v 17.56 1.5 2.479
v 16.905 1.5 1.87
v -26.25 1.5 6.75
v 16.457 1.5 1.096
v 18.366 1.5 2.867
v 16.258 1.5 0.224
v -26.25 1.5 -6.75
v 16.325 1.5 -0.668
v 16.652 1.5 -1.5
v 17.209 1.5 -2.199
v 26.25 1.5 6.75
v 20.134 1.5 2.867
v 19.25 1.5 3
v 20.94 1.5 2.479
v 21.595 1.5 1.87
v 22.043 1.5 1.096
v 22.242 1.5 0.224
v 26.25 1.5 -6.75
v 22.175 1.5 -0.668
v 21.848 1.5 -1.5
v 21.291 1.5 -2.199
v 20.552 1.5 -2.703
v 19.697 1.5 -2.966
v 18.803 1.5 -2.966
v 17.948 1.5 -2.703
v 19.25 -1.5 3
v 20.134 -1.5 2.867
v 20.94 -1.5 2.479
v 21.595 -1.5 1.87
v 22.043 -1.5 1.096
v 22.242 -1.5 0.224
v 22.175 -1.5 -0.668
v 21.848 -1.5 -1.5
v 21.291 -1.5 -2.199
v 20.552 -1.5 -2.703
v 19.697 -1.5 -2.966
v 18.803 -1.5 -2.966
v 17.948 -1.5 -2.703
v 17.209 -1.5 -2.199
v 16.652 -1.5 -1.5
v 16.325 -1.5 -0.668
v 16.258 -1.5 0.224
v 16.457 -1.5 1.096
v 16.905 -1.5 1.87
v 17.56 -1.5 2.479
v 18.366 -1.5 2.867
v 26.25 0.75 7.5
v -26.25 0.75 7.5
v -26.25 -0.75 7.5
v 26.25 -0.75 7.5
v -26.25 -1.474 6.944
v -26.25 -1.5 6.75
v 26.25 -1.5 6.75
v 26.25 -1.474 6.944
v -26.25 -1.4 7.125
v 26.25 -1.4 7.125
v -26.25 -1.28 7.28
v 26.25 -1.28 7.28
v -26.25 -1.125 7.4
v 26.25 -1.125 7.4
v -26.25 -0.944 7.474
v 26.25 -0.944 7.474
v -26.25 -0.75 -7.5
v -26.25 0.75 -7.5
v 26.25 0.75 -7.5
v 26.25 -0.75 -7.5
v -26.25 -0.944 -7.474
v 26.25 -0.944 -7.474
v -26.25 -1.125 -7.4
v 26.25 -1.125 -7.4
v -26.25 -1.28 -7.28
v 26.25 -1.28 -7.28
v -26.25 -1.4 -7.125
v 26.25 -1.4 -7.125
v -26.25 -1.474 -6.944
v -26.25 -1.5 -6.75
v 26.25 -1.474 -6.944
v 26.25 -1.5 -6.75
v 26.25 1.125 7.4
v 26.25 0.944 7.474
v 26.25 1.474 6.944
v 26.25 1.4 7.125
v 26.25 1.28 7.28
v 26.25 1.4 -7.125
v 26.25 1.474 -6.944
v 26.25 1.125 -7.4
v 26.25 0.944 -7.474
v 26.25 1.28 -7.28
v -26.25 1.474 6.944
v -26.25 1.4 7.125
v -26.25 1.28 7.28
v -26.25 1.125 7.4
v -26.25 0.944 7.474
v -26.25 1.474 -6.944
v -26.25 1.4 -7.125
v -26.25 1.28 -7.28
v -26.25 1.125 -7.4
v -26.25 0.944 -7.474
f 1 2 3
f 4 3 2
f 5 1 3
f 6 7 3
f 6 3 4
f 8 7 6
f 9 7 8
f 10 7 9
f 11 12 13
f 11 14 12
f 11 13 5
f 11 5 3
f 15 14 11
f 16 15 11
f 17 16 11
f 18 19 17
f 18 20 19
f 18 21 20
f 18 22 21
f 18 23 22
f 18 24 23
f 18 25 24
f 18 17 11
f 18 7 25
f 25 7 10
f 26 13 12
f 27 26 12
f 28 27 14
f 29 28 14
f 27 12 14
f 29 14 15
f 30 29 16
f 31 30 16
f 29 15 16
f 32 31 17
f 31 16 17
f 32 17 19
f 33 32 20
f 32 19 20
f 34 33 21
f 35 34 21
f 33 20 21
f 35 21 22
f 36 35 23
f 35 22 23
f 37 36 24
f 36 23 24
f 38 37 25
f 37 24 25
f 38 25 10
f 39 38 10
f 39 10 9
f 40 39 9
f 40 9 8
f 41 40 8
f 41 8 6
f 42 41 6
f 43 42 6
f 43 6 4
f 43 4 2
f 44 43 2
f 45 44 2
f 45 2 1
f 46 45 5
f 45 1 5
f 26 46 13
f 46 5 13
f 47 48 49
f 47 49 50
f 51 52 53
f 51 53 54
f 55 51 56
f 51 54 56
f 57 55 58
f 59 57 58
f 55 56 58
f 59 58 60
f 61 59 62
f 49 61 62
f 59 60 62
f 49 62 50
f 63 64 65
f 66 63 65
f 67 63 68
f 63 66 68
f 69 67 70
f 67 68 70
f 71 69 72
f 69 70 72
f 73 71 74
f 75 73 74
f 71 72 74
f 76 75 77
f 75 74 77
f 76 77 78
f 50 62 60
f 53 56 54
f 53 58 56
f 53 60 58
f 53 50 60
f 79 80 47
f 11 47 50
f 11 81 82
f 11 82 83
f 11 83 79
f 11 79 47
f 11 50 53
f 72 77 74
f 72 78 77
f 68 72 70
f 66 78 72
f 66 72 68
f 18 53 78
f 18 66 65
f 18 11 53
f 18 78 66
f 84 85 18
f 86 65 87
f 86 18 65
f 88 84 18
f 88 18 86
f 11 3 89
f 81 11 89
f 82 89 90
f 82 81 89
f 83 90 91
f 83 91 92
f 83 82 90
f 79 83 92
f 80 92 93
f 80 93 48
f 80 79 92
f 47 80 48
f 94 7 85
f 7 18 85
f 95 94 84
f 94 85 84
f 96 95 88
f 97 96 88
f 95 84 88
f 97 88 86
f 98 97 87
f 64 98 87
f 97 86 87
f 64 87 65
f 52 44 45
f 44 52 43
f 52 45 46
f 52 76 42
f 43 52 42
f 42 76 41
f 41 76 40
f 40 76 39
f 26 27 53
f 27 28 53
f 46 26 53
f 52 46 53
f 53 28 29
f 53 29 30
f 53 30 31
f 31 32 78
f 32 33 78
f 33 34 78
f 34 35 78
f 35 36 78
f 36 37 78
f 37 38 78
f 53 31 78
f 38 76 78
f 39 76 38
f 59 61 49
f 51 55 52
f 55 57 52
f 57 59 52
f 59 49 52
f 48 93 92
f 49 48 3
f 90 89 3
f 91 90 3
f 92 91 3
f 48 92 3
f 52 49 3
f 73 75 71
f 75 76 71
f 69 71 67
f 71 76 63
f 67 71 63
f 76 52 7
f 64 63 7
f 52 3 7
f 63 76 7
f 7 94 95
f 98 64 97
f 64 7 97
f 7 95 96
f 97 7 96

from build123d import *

# Parameters (mm, degrees)
SKETCH_1_W          = 52.5
SKETCH_1_H          = 15
EXTRUDE_1_DEPTH     = 1.5
FILLET_1_R          = 0.75
SKETCH_2_R          = 3
CUT_EXTRUDE_1_DEPTH = 3


with BuildPart() as part:
    # ｽｹｯﾁ1 → ﾎﾞｽ - 押し出し1 (new, symmetric)
    with BuildSketch(Plane(origin=(0, 0, 0), x_dir=(1, 0, 0), z_dir=(0, 1, 0))):
        Rectangle(SKETCH_1_W, SKETCH_1_H)
    extrude(amount=EXTRUDE_1_DEPTH, both=True)

    # ﾌｨﾚｯﾄ1
    fillet_1_edges = [part.edges().sort_by_distance(p)[0] for p in [
        (0, 1.5, 7.5),
        (0, -1.5, 7.5),
        (0, -1.5, -7.5),
        (0, 1.5, -7.5),
    ]]
    fillet(fillet_1_edges, radius=FILLET_1_R)

    # ｽｹｯﾁ2 → ｶｯﾄ - 押し出し1 (cut)
    with BuildSketch(Plane(origin=(0, 1.5, 0), x_dir=(1, 0, 0), z_dir=(0, 1, 0))):
        with Locations(Location((19.25, 0, 0), (0, 0, 270))):
            Circle(SKETCH_2_R)
    extrude(amount=-CUT_EXTRUDE_1_DEPTH, mode=Mode.SUBTRACT)


solid = part.part
